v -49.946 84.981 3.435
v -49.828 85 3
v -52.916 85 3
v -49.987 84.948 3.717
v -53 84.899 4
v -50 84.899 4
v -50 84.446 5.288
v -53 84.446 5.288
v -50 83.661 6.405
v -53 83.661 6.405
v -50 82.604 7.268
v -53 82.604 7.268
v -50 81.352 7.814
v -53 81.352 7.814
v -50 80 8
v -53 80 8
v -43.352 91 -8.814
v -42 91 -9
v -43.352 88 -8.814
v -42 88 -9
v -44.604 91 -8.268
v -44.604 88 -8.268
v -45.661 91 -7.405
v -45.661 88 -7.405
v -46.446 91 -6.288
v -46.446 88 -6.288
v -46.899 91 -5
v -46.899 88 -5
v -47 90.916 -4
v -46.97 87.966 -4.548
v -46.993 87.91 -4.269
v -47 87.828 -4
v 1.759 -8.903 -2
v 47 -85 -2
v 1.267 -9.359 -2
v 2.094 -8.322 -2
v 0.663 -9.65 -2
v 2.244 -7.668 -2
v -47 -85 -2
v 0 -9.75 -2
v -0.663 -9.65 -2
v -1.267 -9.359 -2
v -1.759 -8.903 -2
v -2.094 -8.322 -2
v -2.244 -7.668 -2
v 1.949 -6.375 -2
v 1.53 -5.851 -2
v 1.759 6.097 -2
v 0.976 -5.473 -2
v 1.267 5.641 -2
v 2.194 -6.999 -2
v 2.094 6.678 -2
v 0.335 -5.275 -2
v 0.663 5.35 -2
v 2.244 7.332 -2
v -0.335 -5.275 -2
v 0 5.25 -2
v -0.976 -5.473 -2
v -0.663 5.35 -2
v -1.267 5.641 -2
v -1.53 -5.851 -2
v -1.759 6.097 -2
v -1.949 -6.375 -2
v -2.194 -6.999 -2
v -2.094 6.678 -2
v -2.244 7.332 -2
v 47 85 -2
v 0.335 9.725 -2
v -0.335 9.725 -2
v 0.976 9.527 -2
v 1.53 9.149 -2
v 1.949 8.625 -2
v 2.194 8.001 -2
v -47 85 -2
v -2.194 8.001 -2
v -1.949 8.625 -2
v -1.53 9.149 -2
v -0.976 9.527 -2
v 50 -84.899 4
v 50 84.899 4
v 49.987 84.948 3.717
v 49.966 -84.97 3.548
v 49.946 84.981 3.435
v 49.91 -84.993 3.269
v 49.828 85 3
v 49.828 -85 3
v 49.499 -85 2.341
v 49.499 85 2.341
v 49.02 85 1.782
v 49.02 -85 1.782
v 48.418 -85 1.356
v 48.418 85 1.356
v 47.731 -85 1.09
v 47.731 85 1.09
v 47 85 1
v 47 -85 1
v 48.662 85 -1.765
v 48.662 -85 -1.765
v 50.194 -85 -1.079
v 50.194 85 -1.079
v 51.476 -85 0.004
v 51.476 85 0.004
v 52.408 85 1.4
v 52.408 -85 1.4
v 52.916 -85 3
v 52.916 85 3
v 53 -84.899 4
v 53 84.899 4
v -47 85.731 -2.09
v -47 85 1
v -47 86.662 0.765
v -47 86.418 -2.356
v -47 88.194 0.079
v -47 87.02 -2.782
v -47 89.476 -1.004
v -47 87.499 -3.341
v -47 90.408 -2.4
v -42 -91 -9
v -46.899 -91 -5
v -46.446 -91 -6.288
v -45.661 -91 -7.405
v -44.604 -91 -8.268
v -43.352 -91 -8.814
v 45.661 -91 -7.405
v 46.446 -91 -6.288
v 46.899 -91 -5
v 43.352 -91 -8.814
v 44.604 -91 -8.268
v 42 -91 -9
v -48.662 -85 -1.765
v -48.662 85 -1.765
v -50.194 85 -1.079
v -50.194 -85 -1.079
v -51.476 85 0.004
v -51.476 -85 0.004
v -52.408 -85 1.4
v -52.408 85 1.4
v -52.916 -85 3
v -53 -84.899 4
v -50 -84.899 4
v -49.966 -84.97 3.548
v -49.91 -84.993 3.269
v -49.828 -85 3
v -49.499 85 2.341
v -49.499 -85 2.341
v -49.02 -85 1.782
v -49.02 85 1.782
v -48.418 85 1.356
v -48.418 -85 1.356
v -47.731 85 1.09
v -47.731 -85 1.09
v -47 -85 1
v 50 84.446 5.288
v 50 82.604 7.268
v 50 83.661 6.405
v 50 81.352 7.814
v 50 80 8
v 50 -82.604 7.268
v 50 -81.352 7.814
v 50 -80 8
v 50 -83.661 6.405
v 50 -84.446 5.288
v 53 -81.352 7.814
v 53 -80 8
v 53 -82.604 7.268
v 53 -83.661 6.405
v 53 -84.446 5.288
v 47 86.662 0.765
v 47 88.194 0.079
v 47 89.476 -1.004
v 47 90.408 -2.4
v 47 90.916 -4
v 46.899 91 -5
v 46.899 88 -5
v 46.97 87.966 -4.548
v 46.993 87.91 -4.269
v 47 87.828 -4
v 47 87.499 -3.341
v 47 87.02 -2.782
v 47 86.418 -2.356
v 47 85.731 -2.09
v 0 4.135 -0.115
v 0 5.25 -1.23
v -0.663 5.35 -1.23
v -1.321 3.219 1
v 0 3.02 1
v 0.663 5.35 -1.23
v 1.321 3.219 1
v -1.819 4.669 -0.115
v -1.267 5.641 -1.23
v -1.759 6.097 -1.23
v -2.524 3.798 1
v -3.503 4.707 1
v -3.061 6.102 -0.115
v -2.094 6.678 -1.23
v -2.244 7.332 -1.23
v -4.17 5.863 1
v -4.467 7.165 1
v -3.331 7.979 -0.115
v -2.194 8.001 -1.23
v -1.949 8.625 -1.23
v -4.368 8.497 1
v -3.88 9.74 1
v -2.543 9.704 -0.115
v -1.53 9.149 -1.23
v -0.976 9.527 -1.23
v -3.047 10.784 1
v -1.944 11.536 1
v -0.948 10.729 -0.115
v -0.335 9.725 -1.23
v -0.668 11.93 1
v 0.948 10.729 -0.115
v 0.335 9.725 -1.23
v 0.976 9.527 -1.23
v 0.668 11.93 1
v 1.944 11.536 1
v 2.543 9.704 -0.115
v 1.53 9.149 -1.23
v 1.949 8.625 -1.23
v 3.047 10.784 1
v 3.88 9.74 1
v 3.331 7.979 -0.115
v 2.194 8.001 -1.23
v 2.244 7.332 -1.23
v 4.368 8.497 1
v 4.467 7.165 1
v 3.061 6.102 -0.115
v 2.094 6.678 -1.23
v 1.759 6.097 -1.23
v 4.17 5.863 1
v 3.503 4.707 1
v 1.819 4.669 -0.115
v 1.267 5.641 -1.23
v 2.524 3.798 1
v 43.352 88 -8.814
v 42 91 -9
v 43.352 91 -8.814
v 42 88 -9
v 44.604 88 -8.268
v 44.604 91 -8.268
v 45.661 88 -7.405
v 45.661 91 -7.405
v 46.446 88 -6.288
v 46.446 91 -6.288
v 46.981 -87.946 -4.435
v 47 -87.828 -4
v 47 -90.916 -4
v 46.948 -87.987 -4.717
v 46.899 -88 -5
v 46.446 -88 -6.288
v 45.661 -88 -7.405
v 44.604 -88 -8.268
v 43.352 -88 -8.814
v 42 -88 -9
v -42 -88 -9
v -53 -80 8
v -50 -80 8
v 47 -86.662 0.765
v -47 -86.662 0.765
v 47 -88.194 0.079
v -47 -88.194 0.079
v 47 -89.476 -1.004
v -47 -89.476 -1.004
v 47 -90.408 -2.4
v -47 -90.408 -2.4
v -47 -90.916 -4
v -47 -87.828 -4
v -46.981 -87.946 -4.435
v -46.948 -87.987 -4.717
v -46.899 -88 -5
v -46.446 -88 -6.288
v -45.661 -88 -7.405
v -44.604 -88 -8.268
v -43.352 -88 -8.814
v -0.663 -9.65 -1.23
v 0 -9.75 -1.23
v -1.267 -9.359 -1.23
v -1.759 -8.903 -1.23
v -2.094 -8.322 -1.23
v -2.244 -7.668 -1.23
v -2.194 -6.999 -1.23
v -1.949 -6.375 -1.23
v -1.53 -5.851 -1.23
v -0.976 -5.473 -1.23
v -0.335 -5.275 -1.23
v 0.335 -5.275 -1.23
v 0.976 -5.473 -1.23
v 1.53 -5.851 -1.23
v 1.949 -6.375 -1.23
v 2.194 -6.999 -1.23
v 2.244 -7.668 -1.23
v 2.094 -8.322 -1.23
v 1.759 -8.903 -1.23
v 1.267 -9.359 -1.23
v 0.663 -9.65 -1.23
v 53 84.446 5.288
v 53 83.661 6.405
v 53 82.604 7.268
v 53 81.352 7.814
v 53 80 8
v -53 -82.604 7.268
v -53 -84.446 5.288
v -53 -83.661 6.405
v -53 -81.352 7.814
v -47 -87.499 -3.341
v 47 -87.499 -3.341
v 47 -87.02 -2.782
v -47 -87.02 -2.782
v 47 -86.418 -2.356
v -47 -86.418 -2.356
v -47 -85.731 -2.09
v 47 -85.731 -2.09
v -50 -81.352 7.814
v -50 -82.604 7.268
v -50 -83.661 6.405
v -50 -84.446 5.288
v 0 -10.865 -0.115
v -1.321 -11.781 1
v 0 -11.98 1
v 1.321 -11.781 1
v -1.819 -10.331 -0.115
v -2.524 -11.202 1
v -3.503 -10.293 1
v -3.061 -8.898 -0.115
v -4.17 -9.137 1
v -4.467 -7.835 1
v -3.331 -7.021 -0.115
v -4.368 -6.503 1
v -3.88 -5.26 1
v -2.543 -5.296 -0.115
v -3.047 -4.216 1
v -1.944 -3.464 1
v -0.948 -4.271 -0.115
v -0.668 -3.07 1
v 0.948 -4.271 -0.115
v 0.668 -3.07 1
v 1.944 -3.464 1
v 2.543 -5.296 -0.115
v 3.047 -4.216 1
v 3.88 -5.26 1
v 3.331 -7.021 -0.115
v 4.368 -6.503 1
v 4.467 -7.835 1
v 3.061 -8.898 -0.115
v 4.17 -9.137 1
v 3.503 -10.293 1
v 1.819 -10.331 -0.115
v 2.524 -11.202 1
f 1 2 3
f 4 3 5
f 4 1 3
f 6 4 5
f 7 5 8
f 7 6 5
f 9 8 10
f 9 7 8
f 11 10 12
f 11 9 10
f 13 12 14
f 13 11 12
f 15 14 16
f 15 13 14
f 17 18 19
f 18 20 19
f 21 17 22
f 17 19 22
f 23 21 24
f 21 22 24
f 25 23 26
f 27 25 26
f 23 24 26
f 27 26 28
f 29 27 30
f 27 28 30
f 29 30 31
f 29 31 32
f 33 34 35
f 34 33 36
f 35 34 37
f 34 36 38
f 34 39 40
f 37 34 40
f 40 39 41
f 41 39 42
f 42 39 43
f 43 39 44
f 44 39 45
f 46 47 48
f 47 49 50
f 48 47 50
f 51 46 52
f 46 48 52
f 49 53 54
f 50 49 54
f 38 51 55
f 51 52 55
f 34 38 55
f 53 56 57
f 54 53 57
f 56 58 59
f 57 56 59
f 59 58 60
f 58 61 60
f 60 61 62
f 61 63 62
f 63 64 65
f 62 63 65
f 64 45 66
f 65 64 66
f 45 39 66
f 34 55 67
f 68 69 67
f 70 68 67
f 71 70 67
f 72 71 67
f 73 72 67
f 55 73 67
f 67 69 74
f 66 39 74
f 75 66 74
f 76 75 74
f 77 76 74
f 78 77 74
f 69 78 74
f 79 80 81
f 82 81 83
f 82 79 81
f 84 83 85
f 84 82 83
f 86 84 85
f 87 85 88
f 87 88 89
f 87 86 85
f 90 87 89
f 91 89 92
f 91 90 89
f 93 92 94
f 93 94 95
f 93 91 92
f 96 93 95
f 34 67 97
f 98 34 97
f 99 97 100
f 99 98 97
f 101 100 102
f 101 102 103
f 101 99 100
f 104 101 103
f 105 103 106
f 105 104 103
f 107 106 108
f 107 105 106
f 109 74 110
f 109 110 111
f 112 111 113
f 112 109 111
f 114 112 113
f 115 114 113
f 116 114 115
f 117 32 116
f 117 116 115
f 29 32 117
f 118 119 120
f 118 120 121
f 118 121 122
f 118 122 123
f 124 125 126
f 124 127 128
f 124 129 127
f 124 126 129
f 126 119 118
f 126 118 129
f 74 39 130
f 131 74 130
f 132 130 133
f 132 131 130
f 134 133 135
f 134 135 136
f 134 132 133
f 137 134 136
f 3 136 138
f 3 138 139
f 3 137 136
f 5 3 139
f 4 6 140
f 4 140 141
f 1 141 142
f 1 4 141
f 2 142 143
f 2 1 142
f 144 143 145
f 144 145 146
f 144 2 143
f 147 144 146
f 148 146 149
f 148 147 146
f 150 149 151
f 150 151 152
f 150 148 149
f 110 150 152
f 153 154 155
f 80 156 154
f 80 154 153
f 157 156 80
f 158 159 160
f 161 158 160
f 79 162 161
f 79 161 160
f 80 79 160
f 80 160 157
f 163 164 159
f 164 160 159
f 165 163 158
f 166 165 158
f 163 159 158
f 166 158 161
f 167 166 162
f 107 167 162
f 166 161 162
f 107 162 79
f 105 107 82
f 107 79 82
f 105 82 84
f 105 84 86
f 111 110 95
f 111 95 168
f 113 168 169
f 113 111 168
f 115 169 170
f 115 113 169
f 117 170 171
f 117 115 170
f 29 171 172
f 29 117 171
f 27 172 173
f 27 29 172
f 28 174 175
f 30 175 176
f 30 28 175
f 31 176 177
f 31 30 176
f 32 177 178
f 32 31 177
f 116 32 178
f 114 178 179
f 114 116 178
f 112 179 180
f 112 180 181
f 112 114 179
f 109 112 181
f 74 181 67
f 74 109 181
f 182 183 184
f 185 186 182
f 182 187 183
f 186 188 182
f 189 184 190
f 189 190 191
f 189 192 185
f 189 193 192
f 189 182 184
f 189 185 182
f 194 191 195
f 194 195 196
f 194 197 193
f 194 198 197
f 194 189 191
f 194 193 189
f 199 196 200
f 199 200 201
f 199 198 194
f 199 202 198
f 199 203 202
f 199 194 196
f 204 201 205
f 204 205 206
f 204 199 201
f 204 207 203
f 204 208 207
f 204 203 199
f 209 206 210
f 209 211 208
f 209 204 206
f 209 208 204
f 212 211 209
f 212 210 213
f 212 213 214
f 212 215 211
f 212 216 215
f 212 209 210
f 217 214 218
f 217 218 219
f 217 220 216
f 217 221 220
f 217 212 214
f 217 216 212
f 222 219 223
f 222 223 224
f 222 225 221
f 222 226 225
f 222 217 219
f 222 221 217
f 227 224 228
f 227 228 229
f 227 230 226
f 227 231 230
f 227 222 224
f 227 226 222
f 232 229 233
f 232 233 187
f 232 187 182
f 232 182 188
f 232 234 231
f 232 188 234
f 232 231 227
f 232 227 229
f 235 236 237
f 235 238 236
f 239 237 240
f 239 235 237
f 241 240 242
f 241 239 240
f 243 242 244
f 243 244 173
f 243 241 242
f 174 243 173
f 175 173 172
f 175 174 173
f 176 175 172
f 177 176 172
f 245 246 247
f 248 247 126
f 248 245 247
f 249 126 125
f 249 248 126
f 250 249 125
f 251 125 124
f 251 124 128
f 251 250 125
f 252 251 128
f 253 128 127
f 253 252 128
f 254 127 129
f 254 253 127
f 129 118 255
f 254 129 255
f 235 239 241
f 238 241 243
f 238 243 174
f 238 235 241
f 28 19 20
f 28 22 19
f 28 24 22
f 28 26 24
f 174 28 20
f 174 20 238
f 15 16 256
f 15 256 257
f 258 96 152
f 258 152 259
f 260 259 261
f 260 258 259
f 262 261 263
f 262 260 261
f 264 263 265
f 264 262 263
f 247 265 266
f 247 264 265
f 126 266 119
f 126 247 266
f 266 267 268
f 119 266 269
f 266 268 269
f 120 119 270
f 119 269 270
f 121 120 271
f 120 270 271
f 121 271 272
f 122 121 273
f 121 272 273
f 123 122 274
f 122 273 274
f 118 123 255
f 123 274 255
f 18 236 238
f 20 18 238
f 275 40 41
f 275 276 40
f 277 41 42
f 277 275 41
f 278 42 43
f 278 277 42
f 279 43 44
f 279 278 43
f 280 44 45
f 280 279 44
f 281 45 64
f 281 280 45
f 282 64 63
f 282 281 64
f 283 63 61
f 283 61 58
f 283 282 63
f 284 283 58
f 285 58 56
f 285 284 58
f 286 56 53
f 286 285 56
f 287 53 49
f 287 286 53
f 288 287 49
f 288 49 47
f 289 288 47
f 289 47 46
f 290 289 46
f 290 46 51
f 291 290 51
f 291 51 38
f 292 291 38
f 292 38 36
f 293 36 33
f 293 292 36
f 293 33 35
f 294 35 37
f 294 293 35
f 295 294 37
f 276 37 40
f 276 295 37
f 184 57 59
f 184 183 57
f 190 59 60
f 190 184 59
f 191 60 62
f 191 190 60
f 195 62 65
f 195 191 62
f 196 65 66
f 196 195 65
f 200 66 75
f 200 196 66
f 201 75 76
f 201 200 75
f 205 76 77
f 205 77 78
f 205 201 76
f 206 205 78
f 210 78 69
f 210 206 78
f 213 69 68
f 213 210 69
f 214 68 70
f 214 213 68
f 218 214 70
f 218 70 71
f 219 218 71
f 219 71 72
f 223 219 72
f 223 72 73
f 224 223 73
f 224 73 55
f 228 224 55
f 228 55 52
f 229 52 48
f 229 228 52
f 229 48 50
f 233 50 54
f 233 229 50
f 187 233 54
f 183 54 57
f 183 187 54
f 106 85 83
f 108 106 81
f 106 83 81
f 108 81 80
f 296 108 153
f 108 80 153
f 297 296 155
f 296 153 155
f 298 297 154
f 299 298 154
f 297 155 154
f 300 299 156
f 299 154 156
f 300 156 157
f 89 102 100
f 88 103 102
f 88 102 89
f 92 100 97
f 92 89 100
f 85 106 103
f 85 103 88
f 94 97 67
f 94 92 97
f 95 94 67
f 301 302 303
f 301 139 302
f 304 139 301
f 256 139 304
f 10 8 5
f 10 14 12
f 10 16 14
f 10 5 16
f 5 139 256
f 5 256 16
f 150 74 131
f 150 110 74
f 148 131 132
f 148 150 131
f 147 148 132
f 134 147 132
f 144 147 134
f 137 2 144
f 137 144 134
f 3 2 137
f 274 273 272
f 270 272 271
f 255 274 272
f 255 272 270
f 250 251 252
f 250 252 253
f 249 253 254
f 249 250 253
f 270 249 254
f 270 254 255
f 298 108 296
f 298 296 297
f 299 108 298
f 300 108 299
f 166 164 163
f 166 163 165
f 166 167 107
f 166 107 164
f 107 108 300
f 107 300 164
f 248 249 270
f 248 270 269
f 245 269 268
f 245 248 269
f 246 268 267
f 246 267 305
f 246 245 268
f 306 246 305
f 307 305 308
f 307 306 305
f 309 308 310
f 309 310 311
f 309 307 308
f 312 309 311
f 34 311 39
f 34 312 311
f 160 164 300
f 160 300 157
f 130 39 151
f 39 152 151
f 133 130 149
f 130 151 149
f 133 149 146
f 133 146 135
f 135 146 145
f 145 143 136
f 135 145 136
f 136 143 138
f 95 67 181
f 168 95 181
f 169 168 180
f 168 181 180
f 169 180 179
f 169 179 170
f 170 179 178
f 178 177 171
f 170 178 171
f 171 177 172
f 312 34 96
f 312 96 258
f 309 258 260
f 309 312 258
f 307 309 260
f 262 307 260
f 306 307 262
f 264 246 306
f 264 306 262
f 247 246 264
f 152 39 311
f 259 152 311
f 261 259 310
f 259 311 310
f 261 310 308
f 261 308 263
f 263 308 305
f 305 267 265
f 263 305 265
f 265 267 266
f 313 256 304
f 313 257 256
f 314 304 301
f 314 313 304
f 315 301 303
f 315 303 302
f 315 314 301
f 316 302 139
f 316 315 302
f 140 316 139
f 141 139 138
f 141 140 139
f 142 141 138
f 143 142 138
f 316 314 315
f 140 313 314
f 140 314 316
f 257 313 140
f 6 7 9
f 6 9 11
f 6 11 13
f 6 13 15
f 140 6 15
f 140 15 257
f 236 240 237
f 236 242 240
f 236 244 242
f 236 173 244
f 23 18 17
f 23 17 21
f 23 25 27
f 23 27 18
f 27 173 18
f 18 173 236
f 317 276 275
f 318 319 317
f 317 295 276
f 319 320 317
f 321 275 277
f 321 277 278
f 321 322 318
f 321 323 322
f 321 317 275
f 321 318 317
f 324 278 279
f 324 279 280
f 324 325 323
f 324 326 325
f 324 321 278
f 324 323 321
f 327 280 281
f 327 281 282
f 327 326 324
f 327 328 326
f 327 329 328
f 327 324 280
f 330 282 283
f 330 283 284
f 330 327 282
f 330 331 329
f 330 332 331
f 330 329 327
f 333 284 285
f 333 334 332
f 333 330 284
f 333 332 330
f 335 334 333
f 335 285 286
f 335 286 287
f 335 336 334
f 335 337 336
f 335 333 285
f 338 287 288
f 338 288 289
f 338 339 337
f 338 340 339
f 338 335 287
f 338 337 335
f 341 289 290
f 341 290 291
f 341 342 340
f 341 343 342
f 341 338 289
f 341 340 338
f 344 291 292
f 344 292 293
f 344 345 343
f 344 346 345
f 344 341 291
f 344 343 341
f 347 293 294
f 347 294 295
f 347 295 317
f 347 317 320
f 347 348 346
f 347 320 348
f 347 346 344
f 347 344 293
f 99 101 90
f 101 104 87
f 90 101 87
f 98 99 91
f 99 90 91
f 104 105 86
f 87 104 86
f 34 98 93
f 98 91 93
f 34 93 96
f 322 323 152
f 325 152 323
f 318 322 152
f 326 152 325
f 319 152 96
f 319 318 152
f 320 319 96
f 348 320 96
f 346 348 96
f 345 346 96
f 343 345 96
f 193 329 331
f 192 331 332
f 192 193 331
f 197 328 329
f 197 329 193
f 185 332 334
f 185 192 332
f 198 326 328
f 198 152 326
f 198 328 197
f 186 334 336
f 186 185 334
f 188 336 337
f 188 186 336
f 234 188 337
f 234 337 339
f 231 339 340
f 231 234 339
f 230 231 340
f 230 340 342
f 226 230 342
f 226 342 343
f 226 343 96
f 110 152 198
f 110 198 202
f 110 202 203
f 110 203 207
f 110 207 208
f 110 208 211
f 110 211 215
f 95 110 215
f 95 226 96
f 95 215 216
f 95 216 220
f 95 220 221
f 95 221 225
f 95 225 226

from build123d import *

# Parameters (mm, degrees)
SKETCH5_W                      = 100
SKETCH5_H                      = 170
BOSS_EXTRUDE2_DEPTH            = 1
CONVERT_SOLID1_START           = -50
CONVERT_SOLID1_OUTLINE_W       = 170
CONVERT_SOLID1_OUTLINE_H       = 2
CONVERT_SOLID1_DEPTH           = 100
CSK_FOR_M4_SFHCS1_AT_2_COUNT   = 2
CSK_FOR_M4_SFHCS1_AT_2_PITCH   = 15
EDGE_FLANGE3_STRIP_W           = 18
EDGE_FLANGE3_STRIP_H           = 3
EDGE_FLANGE3_STRIP_CUT_DEPTH   = 170
EDGE_FLANGE3_STRIP_2_W         = 18
EDGE_FLANGE3_STRIP_2_H         = 3
EDGE_FLANGE3_STRIP_CUT_2_DEPTH = 170
EDGE_FLANGE3_DEPTH             = 170
EDGE_FLANGE3_BEND_DEPTH        = 170
EDGE_FLANGE4_DEPTH             = 94
EDGE_FLANGE4_BEND_DEPTH        = 94
FILLET1_R                      = 5


# Read off the part's stored shape, not the designer's step: Convert-Solid1
# Sheet-metal steps are written as plain solids
with BuildPart() as part:
    # Sketch5 → Boss-Extrude2 (new body)
    with BuildSketch(Plane.XY):
        Rectangle(SKETCH5_W, SKETCH5_H)
    extrude(amount=BOSS_EXTRUDE2_DEPTH)

    # Convert-Solid1 outline → Convert-Solid1 (add)
    with BuildSketch(Plane.YZ.offset(CONVERT_SOLID1_START)):
        with Locations((0, -1)):
            Rectangle(CONVERT_SOLID1_OUTLINE_W, CONVERT_SOLID1_OUTLINE_H)
    extrude(amount=CONVERT_SOLID1_DEPTH)

    # Sketch23 → CSK for M4 SFHCS1 (revolve, cut)
    with BuildSketch(Plane(origin=(0, -7.5, 1), x_dir=(0, -1, 0), z_dir=(1, 0, 0))):
        Polygon((0, 0), (0, 3), (2.25, 3), (2.25, 2.23), (4.48, 0), align=None)
    csk_for_m4_sfhcs1 = revolve(axis=Axis((0, -7.5, 7.35), (0, 0, -1)), mode=Mode.SUBTRACT)

    # CSK for M4 SFHCS1 at 2: CSK for M4 SFHCS1 ×2
    with Locations(*[(0, i * CSK_FOR_M4_SFHCS1_AT_2_PITCH, 0) for i in range(1, CSK_FOR_M4_SFHCS1_AT_2_COUNT)]):
        add(csk_for_m4_sfhcs1, mode=Mode.SUBTRACT)

    # Edge-Flange3 strip (across the edge) → Edge-Flange3 strip cut (cut)
    with BuildSketch(Plane(origin=(50, -85, 1), x_dir=(-1, 0, 0), z_dir=(0, 1, 0))):
        with Locations((-6, -1.5)):
            Rectangle(EDGE_FLANGE3_STRIP_W, EDGE_FLANGE3_STRIP_H)
    extrude(amount=EDGE_FLANGE3_STRIP_CUT_DEPTH, mode=Mode.SUBTRACT)

    # Edge-Flange3 strip 2 (across the edge) → Edge-Flange3 strip cut 2 (cut)
    with BuildSketch(Plane(origin=(-50, 85, 1), x_dir=(1, 0, 0), z_dir=(0, -1, 0))):
        with Locations((-6, -1.5)):
            Rectangle(EDGE_FLANGE3_STRIP_2_W, EDGE_FLANGE3_STRIP_2_H)
    extrude(amount=EDGE_FLANGE3_STRIP_CUT_2_DEPTH, mode=Mode.SUBTRACT)

    # Edge-Flange3 section (across the edge) → Edge-Flange3 (add)
    with BuildSketch(Plane(origin=(50, -85, 1), x_dir=(-1, 0, 0), z_dir=(0, 1, 0))):
        with BuildLine():
            Line((-3, 3), (-3, 7))
            Line((-3, 7), (0, 7))
            Line((0, 7), (0, 3))
            ThreePointArc((0, 3), (0.878679656, 0.878679656), (3, 0))
            Line((3, 0), (3, -3))
            ThreePointArc((3, -3), (-1.242640687, -1.242640687), (-3, 3))
        make_face()
    extrude(amount=EDGE_FLANGE3_DEPTH)

    # Edge-Flange3 section 2 (across the edge) → Edge-Flange3 bend (add)
    with BuildSketch(Plane(origin=(-50, 85, 1), x_dir=(1, 0, 0), z_dir=(0, -1, 0))):
        with BuildLine():
            Line((-3, 3), (-3, 7))
            Line((-3, 7), (0, 7))
            Line((0, 7), (0, 3))
            ThreePointArc((0, 3), (0.878679656, 0.878679656), (3, 0))
            Line((3, 0), (3, -3))
            ThreePointArc((3, -3), (-1.242640687, -1.242640687), (-3, 3))
        make_face()
    extrude(amount=EDGE_FLANGE3_BEND_DEPTH)

    # Edge-Flange4 section (across the edge) → Edge-Flange4 (add)
    with BuildSketch(Plane(origin=(47, -88, -2), x_dir=(0, 1, 0), z_dir=(-1, 0, 0))):
        with BuildLine():
            Line((-3, 3), (-3, 7))
            Line((-3, 7), (0, 7))
            Line((0, 7), (0, 3))
            ThreePointArc((0, 3), (0.878679656, 0.878679656), (3, 0))
            Line((3, 0), (3, -3))
            ThreePointArc((3, -3), (-1.242640687, -1.242640687), (-3, 3))
        make_face()
    extrude(amount=EDGE_FLANGE4_DEPTH)

    # Edge-Flange4 section 2 (across the edge) → Edge-Flange4 bend (add)
    with BuildSketch(Plane(origin=(-47, 88, -2), x_dir=(0, -1, 0), z_dir=(1, 0, 0))):
        with BuildLine():
            Line((-3, 3), (-3, 7))
            Line((-3, 7), (0, 7))
            Line((0, 7), (0, 3))
            ThreePointArc((0, 3), (0.878679656, 0.878679656), (3, 0))
            Line((3, 0), (3, -3))
            ThreePointArc((3, -3), (-1.242640687, -1.242640687), (-3, 3))
        make_face()
    extrude(amount=EDGE_FLANGE4_BEND_DEPTH)

    # Fillet1
    fillet1_edges = [part.edges().sort_by_distance(p)[0] for p in [
        (51.5, -85, 8),
        (51.5, 85, 8),
        (47, 89.5, -9),
        (-47, 89.5, -9),
        (-51.5, 85, 8),
        (-51.5, -85, 8),
        (-47, -89.5, -9),
        (47, -89.5, -9),
    ]]
    fillet(fillet1_edges, radius=FILLET1_R)


solid = part.part
